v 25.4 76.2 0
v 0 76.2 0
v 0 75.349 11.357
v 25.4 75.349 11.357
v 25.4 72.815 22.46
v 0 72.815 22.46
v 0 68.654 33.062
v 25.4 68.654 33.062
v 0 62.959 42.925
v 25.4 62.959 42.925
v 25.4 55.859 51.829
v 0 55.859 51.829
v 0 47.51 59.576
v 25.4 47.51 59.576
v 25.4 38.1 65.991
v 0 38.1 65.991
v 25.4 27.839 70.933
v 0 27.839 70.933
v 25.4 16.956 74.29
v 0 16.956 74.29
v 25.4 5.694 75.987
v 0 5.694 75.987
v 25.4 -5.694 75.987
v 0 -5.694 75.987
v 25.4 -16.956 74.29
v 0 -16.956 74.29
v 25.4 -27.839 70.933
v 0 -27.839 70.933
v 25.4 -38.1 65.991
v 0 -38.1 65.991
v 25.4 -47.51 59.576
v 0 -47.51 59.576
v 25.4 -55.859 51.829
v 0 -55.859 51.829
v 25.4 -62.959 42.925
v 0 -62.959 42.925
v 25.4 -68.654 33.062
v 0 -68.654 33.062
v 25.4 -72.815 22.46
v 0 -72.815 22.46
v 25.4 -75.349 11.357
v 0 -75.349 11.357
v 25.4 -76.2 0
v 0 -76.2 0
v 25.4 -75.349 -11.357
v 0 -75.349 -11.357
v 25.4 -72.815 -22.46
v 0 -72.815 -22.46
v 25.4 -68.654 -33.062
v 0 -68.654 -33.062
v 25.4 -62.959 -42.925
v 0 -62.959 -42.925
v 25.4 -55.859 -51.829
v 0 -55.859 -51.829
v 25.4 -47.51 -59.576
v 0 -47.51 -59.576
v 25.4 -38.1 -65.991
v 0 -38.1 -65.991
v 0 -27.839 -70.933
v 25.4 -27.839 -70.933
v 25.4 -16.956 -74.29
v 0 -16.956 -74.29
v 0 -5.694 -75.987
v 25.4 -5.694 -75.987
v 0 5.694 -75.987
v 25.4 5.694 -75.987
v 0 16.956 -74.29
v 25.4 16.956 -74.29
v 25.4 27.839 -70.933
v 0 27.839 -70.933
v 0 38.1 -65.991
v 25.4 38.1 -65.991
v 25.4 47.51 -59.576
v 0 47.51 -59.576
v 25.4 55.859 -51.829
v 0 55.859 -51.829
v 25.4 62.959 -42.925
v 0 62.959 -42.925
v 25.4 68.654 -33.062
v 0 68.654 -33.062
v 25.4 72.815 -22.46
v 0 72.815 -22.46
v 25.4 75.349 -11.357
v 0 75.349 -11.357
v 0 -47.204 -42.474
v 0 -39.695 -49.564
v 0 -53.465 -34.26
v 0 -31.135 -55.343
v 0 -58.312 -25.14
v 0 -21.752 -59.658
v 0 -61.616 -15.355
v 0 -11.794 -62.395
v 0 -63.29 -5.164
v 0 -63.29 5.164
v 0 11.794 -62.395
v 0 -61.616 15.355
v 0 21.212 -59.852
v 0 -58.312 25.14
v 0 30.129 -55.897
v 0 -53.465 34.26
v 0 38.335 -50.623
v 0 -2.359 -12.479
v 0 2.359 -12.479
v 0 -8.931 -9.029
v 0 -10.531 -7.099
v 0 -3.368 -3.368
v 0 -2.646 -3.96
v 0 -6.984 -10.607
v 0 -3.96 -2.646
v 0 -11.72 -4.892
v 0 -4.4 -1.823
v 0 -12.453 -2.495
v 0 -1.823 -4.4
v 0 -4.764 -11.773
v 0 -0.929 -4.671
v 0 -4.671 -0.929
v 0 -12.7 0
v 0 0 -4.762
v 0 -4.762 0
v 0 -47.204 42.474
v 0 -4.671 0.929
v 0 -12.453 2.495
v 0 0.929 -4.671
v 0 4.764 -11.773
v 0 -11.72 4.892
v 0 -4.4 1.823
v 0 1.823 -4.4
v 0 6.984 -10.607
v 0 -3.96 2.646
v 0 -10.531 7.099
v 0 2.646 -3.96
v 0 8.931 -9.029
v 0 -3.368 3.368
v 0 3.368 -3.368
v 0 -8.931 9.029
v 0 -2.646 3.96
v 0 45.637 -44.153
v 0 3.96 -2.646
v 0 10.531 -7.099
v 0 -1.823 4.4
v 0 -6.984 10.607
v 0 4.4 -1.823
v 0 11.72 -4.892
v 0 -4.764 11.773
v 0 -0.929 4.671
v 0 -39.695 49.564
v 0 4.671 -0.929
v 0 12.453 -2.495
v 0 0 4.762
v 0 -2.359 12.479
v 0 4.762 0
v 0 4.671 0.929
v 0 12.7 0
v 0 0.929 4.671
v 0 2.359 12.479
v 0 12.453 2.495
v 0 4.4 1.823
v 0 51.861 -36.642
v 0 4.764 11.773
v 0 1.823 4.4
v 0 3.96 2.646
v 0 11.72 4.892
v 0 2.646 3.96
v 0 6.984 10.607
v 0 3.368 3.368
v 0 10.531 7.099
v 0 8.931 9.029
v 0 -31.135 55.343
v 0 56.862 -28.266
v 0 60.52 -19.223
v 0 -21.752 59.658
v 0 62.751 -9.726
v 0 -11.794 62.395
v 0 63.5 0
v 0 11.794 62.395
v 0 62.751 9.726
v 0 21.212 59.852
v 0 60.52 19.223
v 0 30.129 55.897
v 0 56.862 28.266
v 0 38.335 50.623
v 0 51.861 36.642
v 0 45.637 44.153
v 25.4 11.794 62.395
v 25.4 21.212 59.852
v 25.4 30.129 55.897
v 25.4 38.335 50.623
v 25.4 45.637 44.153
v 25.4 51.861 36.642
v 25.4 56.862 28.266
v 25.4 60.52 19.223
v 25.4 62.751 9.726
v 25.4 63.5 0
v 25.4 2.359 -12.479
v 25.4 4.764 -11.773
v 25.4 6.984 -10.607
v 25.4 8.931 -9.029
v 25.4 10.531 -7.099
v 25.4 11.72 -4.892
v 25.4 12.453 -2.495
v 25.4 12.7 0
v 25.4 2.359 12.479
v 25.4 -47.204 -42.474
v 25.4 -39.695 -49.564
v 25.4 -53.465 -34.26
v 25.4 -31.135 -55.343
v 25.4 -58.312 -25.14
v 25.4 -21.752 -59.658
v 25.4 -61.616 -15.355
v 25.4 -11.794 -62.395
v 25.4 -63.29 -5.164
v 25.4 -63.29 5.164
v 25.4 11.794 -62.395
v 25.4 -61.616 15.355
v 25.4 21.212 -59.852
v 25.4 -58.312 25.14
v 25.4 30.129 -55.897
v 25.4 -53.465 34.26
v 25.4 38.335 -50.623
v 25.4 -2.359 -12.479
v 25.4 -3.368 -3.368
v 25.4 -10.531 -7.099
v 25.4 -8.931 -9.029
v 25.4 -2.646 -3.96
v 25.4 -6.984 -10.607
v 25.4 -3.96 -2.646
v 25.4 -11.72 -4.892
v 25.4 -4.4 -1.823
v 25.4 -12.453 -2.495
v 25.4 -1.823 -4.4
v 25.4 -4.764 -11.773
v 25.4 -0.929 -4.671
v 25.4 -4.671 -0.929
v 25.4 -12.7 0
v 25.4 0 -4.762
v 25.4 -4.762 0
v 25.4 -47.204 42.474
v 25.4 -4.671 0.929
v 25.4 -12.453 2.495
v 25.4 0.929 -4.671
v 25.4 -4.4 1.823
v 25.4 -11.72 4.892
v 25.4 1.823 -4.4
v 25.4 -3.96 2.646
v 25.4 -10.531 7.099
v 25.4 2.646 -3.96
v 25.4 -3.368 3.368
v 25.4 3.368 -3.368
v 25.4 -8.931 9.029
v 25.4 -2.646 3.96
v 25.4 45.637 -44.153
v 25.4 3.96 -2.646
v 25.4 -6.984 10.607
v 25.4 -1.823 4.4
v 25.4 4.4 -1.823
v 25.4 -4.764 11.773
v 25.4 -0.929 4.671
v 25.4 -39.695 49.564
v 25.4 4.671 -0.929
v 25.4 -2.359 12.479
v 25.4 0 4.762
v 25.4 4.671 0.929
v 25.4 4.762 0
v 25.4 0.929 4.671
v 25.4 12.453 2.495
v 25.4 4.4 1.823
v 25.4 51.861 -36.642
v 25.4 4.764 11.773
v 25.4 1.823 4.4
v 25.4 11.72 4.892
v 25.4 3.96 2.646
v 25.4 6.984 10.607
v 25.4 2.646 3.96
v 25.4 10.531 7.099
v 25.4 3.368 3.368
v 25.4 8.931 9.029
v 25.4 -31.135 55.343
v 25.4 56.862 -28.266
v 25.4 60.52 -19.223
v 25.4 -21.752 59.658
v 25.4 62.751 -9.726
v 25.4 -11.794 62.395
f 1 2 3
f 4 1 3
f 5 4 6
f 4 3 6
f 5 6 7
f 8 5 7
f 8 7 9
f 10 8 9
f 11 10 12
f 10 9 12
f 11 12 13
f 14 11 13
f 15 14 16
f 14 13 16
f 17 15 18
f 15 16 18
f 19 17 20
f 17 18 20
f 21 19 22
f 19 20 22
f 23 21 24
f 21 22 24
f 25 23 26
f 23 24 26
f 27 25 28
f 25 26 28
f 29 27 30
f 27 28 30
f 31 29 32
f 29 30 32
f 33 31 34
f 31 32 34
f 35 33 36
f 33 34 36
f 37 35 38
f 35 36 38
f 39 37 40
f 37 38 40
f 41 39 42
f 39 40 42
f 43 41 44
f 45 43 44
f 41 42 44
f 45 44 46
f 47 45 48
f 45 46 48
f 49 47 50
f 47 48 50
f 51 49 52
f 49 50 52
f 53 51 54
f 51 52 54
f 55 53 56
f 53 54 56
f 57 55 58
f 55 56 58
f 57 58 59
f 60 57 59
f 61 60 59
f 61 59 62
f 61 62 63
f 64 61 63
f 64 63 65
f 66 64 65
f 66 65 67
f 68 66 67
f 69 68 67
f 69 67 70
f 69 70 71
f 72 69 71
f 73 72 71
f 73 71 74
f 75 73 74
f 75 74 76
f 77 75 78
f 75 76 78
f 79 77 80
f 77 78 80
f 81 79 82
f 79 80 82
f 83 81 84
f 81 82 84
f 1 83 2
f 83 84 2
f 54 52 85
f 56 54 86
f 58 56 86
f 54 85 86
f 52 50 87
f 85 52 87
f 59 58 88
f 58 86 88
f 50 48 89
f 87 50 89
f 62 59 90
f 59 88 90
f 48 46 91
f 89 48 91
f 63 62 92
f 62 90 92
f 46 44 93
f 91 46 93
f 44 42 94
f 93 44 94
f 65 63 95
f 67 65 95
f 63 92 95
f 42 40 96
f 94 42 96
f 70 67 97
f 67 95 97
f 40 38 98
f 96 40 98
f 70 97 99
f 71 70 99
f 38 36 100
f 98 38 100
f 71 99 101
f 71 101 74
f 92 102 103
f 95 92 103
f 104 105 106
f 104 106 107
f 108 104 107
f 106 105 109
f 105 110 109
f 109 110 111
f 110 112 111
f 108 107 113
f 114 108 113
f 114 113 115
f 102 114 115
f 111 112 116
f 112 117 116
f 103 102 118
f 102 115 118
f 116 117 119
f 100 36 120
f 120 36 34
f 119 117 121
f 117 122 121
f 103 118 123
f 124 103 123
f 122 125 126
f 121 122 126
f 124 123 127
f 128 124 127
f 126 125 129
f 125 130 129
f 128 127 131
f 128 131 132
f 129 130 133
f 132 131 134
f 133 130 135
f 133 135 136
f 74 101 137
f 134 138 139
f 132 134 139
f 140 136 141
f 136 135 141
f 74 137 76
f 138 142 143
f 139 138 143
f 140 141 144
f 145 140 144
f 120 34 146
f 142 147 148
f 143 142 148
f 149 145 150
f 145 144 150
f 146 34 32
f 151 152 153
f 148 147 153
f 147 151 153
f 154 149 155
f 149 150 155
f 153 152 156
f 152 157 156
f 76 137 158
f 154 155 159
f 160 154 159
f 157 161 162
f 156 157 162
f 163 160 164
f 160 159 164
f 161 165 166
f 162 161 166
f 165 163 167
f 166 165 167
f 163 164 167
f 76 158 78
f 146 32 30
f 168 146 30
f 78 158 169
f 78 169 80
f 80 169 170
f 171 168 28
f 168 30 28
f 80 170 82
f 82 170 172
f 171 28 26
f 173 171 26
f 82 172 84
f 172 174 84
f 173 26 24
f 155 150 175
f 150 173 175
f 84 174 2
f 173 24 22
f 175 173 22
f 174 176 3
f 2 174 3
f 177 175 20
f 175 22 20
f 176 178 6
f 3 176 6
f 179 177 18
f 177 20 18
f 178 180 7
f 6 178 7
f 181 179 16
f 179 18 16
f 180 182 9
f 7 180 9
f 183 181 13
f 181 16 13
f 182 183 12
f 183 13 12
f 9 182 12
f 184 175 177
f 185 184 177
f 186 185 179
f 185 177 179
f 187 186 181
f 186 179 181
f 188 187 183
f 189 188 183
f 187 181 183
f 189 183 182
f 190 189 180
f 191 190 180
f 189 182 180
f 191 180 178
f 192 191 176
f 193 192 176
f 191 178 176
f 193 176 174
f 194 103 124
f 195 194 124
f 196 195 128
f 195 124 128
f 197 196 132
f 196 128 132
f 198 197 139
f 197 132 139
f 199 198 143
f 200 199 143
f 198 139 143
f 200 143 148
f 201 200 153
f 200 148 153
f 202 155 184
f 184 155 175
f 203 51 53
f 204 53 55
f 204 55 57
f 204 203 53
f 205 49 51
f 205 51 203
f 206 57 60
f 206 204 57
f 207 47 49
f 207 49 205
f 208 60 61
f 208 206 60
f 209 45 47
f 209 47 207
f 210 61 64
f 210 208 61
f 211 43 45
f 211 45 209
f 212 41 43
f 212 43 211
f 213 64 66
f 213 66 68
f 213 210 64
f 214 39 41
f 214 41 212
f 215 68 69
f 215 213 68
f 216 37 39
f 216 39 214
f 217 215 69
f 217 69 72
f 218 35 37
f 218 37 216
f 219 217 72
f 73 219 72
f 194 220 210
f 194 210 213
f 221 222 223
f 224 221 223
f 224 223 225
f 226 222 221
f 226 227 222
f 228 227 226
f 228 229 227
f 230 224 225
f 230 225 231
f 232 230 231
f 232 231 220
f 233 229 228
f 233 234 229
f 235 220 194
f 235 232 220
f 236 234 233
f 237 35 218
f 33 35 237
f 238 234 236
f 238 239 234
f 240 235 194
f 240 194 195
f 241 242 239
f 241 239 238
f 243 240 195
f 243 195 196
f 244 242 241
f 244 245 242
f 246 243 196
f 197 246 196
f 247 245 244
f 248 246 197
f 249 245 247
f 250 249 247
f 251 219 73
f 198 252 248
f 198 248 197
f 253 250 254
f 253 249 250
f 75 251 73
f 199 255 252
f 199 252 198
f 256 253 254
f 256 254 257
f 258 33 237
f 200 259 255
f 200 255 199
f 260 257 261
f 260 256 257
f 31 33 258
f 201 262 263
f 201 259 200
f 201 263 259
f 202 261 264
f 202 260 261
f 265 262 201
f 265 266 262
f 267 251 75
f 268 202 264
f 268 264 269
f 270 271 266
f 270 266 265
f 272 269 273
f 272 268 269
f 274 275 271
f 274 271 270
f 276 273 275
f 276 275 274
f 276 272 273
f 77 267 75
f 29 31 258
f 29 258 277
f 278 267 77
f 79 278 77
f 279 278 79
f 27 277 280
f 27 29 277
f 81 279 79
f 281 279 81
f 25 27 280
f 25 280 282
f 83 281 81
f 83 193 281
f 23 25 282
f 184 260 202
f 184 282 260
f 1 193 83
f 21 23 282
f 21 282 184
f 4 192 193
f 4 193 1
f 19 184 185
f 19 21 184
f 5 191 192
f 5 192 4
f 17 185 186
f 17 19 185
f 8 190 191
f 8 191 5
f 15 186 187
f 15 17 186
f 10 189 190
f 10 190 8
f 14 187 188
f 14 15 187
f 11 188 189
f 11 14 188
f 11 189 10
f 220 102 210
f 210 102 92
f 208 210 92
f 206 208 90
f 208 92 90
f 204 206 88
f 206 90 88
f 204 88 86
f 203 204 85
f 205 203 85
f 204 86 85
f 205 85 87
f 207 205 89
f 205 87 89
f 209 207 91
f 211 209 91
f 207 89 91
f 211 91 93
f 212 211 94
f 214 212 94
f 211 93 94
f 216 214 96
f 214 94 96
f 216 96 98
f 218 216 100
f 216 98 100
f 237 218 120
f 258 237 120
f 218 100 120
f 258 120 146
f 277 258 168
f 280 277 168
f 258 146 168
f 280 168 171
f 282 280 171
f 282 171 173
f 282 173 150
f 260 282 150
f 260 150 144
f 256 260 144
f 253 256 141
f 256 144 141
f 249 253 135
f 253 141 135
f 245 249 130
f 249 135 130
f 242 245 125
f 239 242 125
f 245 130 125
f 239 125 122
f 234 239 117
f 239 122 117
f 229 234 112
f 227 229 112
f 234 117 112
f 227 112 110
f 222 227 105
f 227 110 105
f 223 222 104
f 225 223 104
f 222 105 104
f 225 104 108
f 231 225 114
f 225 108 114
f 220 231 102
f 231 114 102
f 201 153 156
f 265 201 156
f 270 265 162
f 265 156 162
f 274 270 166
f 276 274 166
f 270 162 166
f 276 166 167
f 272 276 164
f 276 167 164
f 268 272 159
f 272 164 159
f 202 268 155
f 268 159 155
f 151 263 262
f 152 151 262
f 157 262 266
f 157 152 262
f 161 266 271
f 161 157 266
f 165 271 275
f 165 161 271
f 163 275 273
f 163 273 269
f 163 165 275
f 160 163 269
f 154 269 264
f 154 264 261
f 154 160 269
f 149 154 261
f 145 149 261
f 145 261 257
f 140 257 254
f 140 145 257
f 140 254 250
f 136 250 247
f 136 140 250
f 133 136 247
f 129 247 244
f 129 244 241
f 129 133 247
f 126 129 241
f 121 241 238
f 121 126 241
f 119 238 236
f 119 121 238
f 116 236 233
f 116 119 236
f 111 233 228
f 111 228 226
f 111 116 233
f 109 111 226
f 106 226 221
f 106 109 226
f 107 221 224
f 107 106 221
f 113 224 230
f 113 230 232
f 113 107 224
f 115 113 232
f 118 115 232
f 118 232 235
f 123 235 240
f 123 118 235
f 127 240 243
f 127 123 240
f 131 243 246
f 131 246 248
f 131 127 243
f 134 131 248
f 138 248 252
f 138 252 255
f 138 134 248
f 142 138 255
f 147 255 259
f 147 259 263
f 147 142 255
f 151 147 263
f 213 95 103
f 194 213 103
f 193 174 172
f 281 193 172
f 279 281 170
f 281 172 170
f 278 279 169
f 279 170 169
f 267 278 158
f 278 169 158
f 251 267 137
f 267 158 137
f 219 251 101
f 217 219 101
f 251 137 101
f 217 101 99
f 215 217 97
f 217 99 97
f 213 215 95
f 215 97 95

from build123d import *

# Parameters (mm, degrees)
F0_R     = 76.2
F0_R_2   = 4.7625
F1_DEPTH = 25.4


with BuildPart() as f1:
    # F0 (on Right) → F1 (new body)
    with BuildSketch(Plane.YZ):
        Circle(F0_R)
        with BuildLine():
            ThreePointArc((11.794017, 62.395121), (48.893609, 40.517465), (63.5, 0))
            ThreePointArc((63.5, 0), (48.893609, -40.517465), (11.794017, -62.395121))
            ThreePointArc((11.794017, -62.395121), (0, -63.5), (-11.794017, -62.395121))
            ThreePointArc((-11.794017, -62.395121), (-63.5, 0), (-11.794017, 62.395121))
            ThreePointArc((-11.794017, 62.395121), (0, 63.5), (11.794017, 62.395121))
        make_face(mode=Mode.SUBTRACT)
        with BuildLine():
            Line((2.358803, 12.479024), (11.794017, 62.395121))
            ThreePointArc((11.794017, 62.395121), (0, 63.5), (-11.794017, 62.395121))
            Line((-11.794017, 62.395121), (-2.358803, 12.479024))
            ThreePointArc((-2.358803, 12.479024), (0, 12.7), (2.358803, 12.479024))
        make_face()
        with BuildLine():
            ThreePointArc((12.7, 0), (9.778722, 8.103493), (2.358803, 12.479024))
            ThreePointArc((2.358803, 12.479024), (0, 12.7), (-2.358803, 12.479024))
            ThreePointArc((-2.358803, 12.479024), (-12.7, 0), (-2.358803, -12.479024))
            ThreePointArc((-2.358803, -12.479024), (0, -12.7), (2.358803, -12.479024))
            ThreePointArc((2.358803, -12.479024), (9.778722, -8.103493), (12.7, 0))
        make_face()
        Circle(F0_R_2, mode=Mode.SUBTRACT)
        with BuildLine():
            ThreePointArc((-11.794017, -62.395121), (0, -63.5), (11.794017, -62.395121))
            Line((11.794017, -62.395121), (2.358803, -12.479024))
            ThreePointArc((2.358803, -12.479024), (0, -12.7), (-2.358803, -12.479024))
            Line((-2.358803, -12.479024), (-11.794017, -62.395121))
        make_face()
    extrude(amount=F1_DEPTH)


solid = f1.part
